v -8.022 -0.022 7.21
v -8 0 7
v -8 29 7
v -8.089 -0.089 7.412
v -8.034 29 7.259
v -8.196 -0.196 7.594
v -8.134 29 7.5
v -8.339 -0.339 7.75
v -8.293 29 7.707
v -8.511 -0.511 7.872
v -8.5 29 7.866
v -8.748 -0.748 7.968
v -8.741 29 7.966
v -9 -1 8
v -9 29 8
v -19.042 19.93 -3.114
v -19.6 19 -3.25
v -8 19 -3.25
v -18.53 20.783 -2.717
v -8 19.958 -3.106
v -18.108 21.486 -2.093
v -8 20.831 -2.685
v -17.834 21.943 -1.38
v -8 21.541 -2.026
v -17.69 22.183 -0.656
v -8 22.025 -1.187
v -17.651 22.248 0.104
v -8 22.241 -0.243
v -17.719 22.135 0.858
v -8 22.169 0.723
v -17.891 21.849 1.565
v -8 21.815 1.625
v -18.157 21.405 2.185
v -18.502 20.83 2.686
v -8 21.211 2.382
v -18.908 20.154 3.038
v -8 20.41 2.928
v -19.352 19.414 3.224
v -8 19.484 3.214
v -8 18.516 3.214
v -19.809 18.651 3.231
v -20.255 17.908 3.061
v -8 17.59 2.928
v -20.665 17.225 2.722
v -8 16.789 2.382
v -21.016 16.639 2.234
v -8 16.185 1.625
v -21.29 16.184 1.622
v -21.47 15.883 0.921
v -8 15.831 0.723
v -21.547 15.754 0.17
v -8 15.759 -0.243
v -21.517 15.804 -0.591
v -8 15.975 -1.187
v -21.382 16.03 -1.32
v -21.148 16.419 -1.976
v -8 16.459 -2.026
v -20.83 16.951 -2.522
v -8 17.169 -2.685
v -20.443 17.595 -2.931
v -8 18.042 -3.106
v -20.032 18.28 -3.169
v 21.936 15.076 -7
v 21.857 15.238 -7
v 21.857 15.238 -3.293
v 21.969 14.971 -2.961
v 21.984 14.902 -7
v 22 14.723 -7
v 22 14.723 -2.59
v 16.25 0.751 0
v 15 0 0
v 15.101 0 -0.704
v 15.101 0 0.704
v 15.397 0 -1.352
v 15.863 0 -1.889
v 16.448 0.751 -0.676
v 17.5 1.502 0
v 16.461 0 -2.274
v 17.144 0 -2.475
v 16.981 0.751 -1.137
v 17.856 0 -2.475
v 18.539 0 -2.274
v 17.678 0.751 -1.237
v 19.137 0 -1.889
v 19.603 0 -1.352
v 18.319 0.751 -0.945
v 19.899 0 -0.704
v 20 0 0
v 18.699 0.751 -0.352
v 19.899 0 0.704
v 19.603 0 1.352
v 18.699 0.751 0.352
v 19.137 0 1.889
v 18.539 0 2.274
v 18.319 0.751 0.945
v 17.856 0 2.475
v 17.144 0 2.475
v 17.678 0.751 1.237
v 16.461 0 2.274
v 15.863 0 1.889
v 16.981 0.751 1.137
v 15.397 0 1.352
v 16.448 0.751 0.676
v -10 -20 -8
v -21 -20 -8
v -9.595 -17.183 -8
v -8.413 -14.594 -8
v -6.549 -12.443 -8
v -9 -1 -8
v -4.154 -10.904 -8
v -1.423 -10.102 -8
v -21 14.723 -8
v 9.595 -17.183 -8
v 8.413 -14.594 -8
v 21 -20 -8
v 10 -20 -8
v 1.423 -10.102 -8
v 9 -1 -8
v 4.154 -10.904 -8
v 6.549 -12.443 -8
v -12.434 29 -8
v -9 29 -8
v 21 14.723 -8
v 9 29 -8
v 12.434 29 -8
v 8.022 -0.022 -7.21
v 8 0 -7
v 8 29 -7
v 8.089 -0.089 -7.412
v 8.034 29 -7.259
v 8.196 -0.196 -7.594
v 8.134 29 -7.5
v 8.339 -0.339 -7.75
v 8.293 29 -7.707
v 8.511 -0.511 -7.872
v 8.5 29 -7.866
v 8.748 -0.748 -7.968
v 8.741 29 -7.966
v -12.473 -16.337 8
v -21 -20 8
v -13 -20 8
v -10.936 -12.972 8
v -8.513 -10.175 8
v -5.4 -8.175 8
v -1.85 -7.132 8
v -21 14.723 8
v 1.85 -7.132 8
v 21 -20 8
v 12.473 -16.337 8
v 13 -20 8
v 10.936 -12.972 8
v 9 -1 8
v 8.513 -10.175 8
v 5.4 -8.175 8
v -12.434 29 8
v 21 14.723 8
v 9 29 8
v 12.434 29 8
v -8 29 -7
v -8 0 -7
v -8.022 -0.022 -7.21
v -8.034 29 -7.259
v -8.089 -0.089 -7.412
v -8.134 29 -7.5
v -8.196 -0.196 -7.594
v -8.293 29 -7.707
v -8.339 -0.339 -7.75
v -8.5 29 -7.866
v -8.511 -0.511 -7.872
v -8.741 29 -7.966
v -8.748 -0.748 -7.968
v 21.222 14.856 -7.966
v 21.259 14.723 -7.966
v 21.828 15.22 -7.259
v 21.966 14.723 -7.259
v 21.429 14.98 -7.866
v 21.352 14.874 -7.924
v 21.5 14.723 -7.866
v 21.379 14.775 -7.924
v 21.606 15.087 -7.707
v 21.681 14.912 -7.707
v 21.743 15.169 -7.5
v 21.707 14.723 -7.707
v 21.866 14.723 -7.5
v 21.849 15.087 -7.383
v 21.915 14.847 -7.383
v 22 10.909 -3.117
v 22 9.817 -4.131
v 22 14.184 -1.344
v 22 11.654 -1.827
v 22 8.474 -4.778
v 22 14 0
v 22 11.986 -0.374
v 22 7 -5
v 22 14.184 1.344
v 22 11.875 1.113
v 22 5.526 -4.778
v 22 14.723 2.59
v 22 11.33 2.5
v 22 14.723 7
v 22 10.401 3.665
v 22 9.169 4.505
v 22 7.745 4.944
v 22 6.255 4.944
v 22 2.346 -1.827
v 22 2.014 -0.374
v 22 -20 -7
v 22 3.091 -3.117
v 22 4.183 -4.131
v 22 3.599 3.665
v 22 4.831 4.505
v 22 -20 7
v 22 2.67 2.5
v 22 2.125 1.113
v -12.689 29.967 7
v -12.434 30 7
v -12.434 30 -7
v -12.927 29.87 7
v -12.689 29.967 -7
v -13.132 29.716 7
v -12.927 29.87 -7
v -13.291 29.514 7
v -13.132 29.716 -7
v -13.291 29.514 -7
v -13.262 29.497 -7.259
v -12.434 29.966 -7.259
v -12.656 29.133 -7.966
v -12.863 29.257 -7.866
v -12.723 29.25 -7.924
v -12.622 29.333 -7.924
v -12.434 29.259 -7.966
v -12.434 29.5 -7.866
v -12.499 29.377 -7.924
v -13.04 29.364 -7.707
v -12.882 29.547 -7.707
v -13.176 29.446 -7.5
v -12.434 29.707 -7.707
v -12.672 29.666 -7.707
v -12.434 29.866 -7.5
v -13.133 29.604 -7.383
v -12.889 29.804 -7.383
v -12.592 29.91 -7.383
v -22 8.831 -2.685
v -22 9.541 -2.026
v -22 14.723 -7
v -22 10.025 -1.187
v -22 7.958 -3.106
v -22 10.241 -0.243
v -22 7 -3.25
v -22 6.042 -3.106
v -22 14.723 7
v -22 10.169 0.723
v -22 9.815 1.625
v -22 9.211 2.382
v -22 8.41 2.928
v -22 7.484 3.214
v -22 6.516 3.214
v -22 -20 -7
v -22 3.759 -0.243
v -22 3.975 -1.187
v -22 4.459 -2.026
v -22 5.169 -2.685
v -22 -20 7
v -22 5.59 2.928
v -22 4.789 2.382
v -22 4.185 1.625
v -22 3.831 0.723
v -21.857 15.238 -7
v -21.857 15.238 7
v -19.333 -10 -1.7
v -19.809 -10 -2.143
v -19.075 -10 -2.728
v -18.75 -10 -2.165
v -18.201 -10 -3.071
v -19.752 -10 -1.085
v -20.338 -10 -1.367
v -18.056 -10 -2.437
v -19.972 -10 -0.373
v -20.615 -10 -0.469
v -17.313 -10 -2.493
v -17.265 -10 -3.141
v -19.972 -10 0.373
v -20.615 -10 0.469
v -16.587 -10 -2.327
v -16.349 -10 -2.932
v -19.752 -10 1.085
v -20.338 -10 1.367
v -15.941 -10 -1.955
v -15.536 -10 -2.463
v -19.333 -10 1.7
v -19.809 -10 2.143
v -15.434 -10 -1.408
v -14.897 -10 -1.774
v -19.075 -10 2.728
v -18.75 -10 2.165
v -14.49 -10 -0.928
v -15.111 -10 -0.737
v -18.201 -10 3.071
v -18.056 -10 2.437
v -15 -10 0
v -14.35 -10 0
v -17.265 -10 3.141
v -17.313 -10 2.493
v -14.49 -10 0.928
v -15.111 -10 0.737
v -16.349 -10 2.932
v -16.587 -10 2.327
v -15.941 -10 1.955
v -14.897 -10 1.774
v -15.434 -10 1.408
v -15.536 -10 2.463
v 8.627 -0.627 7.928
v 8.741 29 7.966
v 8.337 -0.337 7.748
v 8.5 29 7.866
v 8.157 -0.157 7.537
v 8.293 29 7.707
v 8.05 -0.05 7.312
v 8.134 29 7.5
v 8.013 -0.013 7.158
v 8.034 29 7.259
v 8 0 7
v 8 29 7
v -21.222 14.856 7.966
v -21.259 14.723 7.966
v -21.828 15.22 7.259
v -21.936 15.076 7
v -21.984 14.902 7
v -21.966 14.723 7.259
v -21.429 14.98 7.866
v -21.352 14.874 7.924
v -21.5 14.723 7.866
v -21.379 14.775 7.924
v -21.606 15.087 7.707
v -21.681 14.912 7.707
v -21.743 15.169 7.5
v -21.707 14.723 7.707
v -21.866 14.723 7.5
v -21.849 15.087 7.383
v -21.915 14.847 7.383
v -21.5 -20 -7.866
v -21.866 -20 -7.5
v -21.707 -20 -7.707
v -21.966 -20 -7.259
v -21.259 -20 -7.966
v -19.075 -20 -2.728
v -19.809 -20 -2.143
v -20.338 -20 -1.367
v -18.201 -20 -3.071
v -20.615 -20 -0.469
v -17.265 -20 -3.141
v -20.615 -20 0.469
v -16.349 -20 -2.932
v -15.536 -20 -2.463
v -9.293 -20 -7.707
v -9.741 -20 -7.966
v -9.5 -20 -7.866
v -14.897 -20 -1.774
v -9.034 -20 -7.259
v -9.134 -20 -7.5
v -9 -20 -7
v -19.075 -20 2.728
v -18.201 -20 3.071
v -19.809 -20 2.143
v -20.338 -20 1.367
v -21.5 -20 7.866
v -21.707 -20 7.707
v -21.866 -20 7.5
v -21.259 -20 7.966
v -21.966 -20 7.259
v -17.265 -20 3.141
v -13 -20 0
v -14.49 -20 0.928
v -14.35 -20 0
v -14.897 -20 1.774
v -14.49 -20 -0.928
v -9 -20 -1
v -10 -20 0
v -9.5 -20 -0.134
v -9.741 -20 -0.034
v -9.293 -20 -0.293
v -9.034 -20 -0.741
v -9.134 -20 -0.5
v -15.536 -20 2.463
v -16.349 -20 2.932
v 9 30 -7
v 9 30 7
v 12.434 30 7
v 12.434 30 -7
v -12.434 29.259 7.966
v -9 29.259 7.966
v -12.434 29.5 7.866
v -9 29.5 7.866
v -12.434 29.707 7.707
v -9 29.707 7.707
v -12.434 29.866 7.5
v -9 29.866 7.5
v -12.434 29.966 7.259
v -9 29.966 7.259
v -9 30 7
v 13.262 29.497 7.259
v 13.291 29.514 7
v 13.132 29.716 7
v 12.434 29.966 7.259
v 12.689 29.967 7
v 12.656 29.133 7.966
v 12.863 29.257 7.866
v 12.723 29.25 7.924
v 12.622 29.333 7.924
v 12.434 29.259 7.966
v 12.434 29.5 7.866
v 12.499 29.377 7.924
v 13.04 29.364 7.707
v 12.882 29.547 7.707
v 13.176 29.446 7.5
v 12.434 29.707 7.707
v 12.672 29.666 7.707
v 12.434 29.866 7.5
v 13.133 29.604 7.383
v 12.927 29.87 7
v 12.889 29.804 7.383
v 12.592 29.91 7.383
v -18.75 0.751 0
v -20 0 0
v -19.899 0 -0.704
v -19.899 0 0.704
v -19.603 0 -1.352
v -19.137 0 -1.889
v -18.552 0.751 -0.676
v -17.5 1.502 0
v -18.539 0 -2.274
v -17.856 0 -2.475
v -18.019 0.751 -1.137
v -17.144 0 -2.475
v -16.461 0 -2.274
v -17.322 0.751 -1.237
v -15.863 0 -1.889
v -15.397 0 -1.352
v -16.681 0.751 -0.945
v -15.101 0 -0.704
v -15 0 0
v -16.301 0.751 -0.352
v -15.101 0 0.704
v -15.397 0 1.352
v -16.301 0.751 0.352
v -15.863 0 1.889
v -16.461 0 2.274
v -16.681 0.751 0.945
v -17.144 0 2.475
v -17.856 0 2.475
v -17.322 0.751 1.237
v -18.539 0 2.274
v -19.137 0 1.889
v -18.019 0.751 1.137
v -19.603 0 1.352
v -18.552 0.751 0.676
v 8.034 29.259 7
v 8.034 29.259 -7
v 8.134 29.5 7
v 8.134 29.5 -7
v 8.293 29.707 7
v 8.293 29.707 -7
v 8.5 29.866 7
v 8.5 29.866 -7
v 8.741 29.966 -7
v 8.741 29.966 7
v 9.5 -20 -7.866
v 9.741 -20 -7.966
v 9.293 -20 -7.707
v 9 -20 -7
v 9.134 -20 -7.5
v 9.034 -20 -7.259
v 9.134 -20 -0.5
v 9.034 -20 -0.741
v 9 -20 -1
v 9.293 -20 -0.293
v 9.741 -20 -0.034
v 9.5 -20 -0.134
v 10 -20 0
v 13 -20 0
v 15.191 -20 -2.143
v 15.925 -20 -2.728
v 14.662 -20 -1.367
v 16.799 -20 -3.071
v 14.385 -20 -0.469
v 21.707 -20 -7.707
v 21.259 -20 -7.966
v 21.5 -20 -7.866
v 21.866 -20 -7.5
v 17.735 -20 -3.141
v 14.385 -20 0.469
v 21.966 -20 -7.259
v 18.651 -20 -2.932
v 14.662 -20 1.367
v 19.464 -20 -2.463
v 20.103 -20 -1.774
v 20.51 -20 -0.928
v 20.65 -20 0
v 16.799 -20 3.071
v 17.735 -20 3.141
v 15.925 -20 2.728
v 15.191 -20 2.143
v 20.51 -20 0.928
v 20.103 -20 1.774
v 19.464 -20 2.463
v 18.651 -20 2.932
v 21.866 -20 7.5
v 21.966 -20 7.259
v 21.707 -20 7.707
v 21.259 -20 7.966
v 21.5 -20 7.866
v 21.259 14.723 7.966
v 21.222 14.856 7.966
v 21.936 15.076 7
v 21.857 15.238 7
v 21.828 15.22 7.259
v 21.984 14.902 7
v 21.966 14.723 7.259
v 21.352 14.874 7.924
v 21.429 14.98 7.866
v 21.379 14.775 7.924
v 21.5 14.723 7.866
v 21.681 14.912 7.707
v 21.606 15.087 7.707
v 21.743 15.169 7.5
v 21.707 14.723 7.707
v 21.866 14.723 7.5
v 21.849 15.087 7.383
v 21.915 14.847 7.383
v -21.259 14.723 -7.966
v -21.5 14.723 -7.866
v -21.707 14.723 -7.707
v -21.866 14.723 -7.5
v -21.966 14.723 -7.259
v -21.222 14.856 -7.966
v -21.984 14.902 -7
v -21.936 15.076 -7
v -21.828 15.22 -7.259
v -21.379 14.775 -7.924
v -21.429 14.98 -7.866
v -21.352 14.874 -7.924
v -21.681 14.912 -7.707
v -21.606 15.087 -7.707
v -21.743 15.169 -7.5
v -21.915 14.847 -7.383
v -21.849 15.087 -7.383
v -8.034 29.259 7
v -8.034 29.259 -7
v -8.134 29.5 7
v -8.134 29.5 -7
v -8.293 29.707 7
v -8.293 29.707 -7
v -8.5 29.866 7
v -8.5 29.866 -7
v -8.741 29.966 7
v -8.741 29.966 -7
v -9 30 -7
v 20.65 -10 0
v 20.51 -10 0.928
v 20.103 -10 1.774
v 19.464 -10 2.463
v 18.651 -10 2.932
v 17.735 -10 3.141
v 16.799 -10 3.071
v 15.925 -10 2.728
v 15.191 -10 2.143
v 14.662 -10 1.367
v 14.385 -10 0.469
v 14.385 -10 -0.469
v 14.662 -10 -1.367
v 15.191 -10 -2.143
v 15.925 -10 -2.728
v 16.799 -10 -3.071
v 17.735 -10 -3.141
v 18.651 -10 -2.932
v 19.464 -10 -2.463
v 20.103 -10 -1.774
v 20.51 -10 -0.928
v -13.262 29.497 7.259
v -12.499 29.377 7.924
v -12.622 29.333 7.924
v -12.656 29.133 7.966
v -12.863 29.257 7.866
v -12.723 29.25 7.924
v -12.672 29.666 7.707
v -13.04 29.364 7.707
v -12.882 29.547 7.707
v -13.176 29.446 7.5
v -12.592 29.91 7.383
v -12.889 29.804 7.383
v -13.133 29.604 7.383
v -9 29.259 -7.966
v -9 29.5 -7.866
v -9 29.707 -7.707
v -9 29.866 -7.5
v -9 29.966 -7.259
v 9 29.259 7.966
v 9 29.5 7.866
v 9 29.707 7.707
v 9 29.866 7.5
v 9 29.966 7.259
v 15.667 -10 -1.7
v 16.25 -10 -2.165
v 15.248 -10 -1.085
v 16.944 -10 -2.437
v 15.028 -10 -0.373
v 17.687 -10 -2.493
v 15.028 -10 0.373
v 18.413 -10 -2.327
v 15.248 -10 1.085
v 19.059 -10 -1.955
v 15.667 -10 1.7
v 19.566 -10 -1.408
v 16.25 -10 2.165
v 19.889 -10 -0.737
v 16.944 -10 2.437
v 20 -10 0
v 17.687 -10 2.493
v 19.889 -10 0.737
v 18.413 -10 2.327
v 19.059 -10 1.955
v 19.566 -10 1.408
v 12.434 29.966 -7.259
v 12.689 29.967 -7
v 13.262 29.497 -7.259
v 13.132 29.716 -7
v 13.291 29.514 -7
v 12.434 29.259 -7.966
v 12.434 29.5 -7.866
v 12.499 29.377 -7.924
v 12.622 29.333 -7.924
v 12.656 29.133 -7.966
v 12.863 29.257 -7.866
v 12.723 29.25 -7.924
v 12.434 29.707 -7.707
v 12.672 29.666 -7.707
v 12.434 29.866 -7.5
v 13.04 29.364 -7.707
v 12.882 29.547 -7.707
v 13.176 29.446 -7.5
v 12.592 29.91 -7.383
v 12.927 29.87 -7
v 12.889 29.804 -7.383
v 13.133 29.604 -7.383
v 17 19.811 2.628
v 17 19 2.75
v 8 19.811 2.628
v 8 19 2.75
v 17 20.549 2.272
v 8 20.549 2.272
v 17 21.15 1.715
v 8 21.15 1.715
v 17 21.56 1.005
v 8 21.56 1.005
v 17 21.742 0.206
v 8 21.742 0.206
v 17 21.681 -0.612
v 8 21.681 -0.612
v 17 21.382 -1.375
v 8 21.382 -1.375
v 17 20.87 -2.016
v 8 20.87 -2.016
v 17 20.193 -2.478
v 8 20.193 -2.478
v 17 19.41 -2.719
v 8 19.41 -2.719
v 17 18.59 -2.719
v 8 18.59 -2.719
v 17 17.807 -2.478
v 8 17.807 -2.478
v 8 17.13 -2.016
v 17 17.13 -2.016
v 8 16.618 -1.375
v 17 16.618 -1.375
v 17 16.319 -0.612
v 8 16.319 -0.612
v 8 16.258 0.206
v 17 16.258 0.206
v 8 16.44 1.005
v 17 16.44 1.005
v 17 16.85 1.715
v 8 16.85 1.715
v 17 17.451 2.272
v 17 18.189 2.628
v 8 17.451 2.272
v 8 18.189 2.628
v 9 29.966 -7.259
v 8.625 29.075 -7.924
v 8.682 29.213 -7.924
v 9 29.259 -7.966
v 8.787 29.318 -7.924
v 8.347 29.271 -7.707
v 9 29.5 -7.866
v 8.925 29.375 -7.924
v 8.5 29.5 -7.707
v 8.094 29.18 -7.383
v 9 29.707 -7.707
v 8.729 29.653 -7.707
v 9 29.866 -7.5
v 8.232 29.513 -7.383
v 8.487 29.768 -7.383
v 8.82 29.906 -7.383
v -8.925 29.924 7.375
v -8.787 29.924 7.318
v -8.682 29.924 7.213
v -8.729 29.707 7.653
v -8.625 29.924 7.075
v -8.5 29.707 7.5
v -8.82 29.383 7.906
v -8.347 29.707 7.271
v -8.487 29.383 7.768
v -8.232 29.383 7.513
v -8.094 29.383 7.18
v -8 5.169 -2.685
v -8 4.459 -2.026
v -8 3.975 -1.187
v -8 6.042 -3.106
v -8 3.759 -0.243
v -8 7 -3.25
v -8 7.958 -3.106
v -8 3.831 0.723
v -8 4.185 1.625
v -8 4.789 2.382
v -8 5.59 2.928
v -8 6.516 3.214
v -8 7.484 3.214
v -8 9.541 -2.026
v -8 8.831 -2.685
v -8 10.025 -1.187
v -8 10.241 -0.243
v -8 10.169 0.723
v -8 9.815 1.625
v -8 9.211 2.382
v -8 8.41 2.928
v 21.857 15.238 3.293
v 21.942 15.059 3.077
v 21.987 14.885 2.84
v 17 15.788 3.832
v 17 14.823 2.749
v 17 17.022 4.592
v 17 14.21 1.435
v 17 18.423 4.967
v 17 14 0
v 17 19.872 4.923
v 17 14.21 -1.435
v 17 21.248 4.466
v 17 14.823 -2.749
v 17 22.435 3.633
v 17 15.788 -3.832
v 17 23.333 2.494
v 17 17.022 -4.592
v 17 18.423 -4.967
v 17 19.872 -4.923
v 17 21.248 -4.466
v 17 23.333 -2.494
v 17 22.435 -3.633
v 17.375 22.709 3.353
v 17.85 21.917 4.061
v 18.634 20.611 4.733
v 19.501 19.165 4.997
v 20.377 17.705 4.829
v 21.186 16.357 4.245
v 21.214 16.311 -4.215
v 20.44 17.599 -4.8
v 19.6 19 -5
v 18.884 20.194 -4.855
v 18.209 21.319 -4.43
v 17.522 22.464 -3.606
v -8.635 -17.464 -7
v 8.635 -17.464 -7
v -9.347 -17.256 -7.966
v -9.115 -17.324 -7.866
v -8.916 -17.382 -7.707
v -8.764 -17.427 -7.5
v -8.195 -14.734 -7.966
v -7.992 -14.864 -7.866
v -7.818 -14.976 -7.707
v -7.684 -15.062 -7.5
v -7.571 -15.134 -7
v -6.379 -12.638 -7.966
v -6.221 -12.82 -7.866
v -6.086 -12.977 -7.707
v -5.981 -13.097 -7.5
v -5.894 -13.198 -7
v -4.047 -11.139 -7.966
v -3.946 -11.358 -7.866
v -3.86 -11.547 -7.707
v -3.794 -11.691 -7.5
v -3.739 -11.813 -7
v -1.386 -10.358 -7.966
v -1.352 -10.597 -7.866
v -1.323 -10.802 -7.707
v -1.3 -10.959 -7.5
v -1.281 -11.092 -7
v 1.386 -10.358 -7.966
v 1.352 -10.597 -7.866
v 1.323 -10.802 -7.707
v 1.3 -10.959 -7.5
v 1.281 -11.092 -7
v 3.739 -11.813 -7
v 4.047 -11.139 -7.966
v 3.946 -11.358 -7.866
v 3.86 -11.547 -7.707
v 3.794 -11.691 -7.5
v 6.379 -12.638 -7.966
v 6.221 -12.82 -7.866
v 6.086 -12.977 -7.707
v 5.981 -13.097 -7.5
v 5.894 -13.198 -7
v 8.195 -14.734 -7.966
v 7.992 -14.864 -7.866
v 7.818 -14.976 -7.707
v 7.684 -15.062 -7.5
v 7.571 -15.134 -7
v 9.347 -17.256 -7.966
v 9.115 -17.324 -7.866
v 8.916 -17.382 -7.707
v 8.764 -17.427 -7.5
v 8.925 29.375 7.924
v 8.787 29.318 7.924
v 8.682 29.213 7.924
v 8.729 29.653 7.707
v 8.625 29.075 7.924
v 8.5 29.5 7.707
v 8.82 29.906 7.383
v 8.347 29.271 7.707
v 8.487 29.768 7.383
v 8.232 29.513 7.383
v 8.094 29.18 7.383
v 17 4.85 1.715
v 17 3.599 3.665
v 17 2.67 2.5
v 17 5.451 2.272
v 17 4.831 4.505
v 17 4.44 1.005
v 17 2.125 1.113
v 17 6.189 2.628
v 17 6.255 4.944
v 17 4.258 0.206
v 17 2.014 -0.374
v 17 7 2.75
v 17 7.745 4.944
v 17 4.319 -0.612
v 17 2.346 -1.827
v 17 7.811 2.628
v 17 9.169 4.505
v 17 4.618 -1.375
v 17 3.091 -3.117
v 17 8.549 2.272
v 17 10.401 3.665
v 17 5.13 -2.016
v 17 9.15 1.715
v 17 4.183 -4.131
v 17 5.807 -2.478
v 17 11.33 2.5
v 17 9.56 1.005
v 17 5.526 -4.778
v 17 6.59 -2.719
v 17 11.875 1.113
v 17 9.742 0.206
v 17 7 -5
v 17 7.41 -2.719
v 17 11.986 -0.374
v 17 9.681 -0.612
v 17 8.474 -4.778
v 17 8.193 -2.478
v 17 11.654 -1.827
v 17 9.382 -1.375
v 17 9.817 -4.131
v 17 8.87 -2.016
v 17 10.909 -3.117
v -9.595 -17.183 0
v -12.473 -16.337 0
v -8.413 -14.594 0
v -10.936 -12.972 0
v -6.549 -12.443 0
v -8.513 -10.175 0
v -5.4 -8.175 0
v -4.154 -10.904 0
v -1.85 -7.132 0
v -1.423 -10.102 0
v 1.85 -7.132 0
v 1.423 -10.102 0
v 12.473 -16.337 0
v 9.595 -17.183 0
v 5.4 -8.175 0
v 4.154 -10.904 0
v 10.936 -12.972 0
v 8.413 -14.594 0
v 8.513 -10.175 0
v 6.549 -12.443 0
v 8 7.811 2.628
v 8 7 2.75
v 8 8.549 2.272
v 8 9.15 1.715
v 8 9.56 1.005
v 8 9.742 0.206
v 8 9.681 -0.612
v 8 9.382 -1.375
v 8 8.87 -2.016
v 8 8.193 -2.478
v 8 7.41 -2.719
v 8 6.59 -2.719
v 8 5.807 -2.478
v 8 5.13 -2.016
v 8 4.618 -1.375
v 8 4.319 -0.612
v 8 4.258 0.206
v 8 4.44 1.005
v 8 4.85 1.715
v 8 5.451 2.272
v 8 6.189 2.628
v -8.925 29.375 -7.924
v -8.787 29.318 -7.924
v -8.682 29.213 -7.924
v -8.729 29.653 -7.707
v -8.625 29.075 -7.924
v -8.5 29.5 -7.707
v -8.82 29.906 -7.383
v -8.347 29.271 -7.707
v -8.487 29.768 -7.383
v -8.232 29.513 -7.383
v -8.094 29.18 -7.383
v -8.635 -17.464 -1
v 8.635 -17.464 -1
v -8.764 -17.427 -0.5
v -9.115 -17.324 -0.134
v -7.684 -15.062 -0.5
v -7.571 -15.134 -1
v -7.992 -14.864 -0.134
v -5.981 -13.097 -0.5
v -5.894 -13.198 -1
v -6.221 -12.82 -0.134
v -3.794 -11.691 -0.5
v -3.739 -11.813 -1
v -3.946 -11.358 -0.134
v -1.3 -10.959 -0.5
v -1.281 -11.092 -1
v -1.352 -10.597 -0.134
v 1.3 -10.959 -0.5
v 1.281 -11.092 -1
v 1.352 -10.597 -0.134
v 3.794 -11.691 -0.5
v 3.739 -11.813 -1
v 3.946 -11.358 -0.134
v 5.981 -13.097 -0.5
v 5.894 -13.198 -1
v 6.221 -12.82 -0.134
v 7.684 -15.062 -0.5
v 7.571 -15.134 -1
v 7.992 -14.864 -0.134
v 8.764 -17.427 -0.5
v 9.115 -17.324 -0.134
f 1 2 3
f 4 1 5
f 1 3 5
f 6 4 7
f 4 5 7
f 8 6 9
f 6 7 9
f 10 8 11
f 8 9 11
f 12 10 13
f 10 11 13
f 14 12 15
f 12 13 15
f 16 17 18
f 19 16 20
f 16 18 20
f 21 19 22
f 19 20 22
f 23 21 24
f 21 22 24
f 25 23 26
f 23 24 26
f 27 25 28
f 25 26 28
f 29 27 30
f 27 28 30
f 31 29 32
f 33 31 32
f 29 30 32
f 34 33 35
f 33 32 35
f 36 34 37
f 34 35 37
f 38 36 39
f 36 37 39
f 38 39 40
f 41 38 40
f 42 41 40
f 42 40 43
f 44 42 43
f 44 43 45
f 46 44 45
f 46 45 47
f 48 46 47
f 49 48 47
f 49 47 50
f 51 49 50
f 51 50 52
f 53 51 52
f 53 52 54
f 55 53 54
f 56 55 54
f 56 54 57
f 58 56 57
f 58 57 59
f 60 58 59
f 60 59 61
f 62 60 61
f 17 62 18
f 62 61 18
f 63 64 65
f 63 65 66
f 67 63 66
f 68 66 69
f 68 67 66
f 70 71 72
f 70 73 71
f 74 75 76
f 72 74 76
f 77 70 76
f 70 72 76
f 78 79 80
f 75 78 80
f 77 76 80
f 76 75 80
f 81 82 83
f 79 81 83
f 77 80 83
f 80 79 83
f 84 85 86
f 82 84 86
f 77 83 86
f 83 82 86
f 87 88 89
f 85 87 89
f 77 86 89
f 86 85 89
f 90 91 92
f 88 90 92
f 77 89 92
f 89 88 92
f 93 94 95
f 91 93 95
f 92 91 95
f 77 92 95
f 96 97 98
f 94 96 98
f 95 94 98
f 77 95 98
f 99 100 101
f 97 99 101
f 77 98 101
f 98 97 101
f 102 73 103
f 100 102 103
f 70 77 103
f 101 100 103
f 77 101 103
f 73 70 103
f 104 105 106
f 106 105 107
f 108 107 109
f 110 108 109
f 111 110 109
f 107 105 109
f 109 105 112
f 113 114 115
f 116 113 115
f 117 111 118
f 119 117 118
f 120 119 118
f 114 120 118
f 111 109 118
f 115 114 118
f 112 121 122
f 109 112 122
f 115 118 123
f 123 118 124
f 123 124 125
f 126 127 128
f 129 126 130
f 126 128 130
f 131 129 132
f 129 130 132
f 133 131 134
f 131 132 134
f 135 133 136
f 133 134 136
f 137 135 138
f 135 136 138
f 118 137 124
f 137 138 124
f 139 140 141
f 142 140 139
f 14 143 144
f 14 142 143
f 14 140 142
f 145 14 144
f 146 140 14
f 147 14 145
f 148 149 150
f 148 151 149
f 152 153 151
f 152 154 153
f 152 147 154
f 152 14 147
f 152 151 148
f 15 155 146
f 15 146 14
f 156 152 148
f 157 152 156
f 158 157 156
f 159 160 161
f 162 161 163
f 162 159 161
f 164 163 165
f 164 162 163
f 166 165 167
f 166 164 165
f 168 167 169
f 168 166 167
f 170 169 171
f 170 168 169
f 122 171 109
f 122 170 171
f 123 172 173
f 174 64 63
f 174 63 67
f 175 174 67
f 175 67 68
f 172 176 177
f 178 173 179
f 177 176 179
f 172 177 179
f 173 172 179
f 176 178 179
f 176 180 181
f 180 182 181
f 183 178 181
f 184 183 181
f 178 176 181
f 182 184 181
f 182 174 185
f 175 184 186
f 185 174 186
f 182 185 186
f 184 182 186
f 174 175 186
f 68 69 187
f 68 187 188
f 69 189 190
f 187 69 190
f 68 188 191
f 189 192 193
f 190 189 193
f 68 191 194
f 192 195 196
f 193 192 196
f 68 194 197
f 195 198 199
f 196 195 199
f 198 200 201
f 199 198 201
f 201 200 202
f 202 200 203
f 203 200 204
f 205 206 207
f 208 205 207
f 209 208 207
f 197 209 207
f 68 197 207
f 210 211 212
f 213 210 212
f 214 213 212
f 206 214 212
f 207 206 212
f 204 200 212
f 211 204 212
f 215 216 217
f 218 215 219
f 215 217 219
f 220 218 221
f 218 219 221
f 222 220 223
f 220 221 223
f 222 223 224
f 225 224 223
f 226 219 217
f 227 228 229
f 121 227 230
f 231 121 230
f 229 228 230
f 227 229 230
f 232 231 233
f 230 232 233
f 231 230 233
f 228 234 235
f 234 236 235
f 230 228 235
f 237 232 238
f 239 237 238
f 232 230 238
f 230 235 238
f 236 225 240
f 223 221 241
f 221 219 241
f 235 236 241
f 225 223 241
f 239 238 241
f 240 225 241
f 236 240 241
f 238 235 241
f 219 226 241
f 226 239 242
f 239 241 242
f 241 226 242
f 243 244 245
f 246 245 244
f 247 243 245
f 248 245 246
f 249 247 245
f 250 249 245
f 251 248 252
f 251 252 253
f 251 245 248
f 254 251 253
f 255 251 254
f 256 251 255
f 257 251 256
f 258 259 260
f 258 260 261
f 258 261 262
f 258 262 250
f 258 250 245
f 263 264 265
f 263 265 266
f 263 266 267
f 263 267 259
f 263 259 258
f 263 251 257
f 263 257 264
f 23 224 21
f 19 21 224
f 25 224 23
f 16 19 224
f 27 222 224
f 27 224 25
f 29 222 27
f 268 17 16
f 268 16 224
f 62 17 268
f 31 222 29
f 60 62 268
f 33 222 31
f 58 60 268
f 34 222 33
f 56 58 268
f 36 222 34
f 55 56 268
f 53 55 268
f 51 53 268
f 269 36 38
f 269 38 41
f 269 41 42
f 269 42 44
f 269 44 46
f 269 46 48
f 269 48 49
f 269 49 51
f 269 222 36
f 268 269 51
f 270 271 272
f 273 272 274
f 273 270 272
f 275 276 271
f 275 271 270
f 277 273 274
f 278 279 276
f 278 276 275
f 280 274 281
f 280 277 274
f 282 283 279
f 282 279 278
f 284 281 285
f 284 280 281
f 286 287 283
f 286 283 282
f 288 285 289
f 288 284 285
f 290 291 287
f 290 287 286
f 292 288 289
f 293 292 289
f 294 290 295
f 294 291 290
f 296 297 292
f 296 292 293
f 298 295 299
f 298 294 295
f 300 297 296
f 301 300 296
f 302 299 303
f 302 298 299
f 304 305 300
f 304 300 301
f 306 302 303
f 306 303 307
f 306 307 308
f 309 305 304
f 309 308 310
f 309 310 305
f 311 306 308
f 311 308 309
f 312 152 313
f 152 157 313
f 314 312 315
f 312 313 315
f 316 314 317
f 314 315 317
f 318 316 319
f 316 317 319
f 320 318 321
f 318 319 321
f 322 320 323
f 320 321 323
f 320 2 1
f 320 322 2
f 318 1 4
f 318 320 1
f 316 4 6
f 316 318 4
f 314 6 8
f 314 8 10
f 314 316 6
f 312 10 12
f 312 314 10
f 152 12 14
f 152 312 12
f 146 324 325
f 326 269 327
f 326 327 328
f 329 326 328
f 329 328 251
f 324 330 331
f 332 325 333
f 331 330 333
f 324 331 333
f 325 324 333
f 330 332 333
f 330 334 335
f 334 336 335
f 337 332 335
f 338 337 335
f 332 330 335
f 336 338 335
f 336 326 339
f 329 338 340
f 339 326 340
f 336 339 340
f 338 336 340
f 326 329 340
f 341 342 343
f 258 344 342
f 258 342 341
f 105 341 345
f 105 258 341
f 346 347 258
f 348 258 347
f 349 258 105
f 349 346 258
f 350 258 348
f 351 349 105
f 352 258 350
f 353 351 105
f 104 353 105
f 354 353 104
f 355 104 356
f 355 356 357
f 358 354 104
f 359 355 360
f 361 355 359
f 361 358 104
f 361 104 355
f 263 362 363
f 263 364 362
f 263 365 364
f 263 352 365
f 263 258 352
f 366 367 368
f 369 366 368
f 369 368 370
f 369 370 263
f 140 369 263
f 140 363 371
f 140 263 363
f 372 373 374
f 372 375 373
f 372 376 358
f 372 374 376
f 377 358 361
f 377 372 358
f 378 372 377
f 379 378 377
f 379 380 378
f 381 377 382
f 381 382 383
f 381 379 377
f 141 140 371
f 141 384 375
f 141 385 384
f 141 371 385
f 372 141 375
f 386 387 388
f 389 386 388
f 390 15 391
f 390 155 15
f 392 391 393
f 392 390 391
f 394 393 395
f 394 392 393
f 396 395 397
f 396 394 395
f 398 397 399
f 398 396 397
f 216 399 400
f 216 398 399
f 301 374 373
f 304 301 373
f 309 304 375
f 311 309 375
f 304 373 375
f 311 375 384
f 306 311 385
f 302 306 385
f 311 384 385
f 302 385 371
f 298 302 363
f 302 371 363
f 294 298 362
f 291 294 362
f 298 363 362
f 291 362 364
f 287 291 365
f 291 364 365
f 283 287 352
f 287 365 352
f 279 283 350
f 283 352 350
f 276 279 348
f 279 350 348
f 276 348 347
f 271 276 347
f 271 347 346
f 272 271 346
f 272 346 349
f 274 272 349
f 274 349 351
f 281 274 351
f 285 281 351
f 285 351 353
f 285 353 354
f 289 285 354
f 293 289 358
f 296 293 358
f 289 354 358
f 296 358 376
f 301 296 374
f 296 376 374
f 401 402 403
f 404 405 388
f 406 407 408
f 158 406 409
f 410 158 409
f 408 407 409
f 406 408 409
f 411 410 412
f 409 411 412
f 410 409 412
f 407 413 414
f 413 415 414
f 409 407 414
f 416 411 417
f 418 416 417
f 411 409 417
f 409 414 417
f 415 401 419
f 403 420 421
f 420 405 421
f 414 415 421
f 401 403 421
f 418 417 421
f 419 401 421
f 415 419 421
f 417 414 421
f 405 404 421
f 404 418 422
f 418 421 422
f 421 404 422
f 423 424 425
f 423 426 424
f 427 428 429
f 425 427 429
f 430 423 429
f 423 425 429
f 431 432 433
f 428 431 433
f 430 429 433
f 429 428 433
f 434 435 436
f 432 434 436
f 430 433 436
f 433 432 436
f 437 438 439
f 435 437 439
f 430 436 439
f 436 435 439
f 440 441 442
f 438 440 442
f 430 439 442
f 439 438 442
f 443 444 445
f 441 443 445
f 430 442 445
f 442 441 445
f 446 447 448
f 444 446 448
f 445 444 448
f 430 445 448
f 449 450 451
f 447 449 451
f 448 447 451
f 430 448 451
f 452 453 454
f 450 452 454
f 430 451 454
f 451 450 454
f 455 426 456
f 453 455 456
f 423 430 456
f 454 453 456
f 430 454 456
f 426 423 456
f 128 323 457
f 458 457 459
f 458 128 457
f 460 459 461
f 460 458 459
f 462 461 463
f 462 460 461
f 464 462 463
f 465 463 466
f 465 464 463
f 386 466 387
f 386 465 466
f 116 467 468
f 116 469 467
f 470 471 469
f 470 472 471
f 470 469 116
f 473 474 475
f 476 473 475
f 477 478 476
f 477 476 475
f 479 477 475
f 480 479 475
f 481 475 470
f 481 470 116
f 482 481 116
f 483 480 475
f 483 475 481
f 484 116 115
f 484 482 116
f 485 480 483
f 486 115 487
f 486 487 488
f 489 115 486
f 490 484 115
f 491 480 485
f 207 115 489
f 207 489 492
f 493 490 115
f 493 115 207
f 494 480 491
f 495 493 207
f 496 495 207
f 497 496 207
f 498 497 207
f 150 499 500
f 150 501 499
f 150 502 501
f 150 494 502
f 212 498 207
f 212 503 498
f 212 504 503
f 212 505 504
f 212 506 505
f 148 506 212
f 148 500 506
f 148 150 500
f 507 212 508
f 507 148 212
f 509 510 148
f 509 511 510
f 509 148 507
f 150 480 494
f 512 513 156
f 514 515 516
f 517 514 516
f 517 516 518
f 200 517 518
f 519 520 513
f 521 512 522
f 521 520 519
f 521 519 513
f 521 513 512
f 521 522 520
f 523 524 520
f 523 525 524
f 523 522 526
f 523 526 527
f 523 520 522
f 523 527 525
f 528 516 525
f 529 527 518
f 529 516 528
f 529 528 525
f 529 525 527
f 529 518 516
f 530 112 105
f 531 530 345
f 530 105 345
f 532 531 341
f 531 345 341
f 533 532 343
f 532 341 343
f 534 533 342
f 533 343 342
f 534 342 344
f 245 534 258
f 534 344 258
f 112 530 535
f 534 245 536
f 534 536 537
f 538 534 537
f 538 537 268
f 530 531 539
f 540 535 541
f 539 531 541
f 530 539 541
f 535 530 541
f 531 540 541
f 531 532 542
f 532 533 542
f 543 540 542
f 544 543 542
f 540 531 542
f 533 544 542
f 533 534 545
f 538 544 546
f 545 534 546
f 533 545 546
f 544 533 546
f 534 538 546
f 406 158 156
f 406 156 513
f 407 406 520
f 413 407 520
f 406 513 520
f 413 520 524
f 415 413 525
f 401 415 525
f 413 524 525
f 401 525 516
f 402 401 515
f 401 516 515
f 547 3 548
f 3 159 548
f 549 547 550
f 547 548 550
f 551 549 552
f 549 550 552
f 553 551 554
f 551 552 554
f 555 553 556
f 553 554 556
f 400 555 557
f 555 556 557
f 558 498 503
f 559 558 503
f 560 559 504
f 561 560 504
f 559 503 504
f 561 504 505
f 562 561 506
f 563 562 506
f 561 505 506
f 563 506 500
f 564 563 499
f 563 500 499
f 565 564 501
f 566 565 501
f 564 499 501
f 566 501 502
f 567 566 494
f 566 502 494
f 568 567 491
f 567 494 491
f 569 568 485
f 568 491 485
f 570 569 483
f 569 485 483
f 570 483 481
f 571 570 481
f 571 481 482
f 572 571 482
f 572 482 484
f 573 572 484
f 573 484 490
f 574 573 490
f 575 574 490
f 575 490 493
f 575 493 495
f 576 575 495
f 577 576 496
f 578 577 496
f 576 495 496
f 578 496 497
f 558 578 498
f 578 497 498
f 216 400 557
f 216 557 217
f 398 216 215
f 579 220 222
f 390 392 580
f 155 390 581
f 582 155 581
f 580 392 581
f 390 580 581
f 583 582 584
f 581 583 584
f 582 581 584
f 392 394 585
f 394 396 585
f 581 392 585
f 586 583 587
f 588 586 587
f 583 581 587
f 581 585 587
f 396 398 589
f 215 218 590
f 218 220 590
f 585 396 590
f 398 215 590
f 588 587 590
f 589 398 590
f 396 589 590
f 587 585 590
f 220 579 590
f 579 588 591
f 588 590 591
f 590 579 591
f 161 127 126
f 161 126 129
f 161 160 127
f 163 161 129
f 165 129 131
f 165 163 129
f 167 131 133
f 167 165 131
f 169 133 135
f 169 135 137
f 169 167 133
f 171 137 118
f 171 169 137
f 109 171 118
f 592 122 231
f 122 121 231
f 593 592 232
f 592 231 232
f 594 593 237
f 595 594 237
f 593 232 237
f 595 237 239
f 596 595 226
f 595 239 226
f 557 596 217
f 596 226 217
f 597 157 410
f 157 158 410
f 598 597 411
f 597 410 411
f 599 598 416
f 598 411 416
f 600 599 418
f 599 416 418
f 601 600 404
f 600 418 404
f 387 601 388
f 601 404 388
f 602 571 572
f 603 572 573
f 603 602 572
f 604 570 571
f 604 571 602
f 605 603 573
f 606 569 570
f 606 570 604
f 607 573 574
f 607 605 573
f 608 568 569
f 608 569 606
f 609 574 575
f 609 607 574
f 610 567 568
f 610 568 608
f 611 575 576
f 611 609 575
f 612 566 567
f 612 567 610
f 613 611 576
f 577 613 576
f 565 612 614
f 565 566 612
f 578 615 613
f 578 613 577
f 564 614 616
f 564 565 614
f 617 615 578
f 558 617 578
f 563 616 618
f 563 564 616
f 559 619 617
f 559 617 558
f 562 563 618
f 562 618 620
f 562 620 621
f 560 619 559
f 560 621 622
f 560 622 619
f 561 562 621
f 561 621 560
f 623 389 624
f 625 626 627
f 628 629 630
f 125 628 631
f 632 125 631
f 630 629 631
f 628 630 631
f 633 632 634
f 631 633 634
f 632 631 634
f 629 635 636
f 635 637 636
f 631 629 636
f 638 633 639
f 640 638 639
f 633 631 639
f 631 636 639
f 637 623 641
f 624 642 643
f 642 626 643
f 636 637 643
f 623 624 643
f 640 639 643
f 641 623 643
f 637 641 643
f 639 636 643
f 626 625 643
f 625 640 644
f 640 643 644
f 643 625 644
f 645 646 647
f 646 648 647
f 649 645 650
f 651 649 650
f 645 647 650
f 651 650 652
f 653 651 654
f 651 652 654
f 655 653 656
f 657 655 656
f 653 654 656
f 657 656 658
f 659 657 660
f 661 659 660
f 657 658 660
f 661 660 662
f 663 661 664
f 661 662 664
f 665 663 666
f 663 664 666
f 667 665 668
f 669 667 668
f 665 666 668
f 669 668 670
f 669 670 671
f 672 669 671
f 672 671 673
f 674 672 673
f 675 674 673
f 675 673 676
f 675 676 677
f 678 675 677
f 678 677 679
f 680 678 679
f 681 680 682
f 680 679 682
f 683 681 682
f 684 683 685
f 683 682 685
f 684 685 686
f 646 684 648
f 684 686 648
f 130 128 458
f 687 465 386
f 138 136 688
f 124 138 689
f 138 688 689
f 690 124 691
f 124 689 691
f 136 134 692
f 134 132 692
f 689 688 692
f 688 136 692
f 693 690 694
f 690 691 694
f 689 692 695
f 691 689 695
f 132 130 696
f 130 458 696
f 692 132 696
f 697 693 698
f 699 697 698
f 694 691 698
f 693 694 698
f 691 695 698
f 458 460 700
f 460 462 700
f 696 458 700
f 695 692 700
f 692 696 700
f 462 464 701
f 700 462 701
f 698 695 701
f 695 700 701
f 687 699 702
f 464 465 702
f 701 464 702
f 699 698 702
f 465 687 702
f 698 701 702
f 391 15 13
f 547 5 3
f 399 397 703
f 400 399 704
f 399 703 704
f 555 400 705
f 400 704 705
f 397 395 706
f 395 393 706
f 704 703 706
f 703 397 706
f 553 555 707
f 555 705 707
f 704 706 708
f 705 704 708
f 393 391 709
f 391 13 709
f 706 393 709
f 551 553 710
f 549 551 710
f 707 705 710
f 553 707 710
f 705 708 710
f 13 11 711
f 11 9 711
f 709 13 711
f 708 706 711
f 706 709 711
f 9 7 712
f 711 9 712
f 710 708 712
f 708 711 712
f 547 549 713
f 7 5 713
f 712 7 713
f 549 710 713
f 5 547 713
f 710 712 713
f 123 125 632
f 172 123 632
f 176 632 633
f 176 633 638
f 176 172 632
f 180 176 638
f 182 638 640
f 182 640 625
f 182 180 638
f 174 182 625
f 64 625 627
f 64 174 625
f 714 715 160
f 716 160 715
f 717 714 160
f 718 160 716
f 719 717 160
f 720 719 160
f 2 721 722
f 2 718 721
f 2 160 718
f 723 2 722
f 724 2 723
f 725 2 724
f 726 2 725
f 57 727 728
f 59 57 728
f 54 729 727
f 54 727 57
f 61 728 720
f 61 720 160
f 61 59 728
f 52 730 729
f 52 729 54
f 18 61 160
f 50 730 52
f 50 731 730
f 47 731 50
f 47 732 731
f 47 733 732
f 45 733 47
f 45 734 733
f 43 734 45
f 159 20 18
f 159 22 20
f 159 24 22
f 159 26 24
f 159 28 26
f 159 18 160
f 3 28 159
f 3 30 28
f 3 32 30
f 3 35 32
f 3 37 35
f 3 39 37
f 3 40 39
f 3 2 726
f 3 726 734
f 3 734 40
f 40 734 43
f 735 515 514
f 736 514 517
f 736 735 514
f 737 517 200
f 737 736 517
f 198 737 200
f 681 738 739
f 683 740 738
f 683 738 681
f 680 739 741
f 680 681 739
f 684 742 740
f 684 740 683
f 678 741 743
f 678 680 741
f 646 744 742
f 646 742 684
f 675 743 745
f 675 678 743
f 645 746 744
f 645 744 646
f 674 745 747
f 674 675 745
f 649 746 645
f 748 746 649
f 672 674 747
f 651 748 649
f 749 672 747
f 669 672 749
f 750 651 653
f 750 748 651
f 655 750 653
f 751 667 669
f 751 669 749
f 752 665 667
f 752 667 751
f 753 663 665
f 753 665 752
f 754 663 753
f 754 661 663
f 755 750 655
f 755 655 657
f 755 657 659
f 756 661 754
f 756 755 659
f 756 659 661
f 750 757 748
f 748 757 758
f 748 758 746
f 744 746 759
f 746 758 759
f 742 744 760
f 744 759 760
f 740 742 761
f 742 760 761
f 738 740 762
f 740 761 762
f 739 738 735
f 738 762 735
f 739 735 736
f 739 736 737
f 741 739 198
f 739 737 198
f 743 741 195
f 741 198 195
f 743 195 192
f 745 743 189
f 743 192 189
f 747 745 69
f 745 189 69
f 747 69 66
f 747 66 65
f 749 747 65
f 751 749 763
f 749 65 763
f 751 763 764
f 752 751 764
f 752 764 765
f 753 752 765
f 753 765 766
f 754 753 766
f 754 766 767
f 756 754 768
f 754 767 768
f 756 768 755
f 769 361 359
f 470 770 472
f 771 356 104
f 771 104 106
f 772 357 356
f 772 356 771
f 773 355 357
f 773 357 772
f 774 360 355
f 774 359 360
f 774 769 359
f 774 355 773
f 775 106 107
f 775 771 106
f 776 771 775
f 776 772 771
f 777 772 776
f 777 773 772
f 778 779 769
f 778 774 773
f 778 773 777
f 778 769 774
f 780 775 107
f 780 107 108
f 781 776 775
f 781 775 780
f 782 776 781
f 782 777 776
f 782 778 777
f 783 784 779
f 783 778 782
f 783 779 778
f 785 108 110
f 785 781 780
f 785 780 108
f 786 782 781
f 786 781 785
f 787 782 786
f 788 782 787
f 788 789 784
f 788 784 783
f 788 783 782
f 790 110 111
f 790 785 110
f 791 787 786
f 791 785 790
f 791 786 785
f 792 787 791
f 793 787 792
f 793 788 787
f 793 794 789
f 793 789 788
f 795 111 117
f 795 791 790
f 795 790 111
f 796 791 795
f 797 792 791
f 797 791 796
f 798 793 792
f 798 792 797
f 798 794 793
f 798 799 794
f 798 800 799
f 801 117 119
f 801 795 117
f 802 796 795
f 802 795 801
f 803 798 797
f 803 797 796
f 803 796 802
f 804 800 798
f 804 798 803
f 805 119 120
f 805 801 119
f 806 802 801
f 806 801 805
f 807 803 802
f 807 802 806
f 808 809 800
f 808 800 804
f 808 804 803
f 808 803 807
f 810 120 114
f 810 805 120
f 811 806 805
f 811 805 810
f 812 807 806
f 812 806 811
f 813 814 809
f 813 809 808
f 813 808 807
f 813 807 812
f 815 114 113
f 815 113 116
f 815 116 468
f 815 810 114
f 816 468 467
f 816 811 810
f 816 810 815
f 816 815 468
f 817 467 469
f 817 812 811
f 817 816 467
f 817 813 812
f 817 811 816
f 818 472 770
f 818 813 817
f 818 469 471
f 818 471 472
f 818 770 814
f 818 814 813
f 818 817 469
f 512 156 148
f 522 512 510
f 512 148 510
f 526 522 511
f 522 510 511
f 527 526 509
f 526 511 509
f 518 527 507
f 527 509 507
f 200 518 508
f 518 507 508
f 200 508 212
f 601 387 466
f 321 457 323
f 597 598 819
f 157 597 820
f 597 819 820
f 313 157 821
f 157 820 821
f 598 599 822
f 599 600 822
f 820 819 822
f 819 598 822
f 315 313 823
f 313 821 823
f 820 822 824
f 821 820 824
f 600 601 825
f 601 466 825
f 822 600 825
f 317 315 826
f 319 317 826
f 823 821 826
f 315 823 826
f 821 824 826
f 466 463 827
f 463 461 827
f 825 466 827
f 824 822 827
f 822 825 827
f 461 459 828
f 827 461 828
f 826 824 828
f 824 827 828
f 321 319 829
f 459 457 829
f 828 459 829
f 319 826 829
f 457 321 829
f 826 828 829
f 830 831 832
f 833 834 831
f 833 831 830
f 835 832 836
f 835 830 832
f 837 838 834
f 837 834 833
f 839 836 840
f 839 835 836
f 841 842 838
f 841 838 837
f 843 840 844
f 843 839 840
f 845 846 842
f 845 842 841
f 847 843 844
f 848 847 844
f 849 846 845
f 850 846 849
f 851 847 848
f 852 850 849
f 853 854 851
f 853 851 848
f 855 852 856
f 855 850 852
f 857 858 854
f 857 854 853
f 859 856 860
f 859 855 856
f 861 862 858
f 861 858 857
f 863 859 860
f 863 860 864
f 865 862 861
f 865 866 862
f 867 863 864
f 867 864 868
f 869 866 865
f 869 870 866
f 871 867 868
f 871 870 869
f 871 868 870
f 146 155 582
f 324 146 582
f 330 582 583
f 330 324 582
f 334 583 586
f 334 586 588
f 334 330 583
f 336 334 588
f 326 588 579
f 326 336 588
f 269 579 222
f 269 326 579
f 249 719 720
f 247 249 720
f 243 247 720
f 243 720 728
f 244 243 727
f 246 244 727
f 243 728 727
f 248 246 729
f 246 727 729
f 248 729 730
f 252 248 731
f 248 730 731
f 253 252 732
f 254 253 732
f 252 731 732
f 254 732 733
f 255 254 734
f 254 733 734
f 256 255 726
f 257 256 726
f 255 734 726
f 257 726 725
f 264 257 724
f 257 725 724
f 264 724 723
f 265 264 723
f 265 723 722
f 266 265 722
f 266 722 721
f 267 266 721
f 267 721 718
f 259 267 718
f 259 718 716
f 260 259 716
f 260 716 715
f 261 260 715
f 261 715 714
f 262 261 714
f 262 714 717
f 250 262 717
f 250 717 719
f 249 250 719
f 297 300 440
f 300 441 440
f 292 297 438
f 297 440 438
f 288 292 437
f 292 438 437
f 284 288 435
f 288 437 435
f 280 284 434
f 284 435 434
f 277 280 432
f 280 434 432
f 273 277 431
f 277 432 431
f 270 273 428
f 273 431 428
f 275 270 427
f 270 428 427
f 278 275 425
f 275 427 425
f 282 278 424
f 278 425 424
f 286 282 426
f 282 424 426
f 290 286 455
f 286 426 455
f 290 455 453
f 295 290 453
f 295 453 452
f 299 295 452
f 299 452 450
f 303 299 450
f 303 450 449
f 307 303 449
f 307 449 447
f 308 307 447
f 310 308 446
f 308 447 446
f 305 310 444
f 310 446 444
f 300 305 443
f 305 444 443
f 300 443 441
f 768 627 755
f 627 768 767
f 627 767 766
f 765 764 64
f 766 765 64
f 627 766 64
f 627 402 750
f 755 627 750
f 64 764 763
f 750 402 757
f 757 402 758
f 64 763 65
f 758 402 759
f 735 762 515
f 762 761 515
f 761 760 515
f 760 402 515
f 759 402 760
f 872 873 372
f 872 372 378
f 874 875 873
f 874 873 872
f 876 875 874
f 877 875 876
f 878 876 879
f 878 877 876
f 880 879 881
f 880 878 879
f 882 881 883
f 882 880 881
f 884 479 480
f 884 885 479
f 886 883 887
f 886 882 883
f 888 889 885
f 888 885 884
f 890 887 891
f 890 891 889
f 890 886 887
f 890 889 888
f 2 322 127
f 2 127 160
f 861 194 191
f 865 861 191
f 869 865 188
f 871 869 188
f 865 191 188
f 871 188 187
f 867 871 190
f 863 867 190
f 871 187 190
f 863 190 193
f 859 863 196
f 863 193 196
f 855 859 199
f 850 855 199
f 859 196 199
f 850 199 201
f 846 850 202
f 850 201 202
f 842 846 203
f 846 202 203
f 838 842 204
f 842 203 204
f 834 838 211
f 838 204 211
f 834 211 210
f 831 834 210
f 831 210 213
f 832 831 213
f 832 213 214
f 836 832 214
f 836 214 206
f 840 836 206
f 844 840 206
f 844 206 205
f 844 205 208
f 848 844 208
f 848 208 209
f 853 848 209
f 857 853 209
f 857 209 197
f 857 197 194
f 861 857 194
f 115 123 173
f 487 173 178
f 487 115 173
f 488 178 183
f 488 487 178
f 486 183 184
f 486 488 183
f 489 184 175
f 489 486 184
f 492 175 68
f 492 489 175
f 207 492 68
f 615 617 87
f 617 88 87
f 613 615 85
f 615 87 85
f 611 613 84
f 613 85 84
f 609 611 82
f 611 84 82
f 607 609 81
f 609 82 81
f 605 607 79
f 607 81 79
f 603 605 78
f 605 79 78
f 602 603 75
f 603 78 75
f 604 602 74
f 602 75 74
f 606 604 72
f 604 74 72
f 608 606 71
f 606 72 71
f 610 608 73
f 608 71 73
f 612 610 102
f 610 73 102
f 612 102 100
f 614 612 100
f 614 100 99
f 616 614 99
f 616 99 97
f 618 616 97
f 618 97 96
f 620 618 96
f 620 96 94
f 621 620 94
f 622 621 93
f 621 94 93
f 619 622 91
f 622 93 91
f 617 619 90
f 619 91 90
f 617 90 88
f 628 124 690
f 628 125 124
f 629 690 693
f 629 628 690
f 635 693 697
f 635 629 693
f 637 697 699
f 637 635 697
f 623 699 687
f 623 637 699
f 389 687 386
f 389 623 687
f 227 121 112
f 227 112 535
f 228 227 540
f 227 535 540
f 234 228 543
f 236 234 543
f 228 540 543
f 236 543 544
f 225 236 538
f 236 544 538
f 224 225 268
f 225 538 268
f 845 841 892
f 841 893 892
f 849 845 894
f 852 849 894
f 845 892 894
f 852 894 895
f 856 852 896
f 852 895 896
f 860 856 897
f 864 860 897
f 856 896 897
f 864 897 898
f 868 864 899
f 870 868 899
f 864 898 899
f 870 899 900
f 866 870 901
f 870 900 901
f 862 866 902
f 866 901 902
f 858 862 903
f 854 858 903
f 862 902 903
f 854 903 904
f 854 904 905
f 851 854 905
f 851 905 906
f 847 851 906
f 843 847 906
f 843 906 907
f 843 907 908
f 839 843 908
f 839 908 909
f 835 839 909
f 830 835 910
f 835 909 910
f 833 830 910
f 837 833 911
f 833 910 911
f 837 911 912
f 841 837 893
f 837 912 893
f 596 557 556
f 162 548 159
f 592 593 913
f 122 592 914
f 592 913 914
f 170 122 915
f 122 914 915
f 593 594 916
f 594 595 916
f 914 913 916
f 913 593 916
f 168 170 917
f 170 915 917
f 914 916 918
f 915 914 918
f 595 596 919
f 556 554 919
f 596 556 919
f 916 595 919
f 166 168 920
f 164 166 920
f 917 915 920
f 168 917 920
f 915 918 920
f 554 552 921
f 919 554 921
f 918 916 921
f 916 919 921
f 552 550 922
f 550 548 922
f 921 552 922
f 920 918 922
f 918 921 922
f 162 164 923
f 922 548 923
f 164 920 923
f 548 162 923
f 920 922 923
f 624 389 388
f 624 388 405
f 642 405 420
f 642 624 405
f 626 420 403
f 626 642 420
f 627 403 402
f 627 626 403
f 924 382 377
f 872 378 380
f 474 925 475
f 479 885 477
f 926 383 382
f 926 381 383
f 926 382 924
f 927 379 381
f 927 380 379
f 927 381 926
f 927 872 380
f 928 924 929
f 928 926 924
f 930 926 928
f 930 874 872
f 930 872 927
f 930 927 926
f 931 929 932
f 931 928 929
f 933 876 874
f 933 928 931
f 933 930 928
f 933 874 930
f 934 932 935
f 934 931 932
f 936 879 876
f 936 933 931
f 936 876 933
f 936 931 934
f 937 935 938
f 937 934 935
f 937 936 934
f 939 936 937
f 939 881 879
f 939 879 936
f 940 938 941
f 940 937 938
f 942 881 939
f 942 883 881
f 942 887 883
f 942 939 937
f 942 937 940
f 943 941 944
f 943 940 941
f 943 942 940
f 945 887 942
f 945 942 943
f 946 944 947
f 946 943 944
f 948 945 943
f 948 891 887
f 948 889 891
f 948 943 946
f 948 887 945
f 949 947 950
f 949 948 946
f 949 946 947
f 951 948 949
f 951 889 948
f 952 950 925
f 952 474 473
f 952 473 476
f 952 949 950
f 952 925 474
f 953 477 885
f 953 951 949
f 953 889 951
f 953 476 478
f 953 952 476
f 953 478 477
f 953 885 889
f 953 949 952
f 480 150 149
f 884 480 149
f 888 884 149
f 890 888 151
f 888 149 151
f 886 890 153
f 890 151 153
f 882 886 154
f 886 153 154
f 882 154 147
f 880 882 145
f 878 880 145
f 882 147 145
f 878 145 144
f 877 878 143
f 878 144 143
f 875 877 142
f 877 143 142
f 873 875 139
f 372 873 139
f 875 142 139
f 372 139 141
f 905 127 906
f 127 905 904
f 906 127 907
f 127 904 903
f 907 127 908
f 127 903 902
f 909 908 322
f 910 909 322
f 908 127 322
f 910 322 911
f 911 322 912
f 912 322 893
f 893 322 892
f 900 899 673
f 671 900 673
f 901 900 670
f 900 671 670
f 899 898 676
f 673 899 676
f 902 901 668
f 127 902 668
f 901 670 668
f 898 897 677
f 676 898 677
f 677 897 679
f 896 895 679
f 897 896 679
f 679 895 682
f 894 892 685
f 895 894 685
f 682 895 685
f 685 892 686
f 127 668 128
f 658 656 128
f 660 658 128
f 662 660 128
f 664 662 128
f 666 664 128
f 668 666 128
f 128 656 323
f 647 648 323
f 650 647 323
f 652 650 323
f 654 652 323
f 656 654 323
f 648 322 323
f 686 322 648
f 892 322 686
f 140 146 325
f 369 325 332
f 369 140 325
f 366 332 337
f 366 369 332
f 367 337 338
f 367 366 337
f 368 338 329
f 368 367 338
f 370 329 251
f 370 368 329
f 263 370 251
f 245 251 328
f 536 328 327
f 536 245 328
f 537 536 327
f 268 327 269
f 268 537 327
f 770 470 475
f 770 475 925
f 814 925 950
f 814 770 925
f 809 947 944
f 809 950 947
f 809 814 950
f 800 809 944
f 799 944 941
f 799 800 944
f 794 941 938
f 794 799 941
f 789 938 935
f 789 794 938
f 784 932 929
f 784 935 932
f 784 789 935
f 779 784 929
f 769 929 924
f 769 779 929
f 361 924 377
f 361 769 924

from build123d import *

# Parameters (mm, degrees)
DODANIE_WYCI_GNI_CIE1_DEPTH                       = 8
WYTNIJ_WYCI_GNI_CIE1_DEPTH                        = 8
WYTNIJ_WYCI_GNI_CIE2_DEPTH                        = 39.052595181
WYTNIJ_WYCI_GNI_CIE2_DEPTH_BACK                   = 39.052595181
OTWORY_USTALAJ_CE_5_0MM1_D                        = 5
OTWORY_USTALAJ_CE_5_0MM1_DEPTH                    = 20
OTWORY_USTALAJ_CE_5_0MM1_TIP                      = 1.502151548
SZKIC8_R                                          = 3.15
WYTNIJ_WYCI_GNI_CIE3_DEPTH                        = 10
ZAOKR_GLENIE1_R                                   = 1
POG_BIENIE_WALCOWE_POD_M5_RUB_Z_BEM_W_D           = 5.5
POG_BIENIE_WALCOWE_POD_M5_RUB_Z_BEM_W_DEPTH       = 44
POG_BIENIE_WALCOWE_POD_M5_RUB_Z_BEM_W_CBORE_D     = 10
POG_BIENIE_WALCOWE_POD_M5_RUB_Z_BEM_W_CBORE_DEPTH = 5
POG_BIENIE_WALCOWE_POD_M5_RUB_Z_BEM_W_TIP         = 1.652366702
SZKIC11_R                                         = 3.25
WYTNIJ_WYCI_GNI_CIE4_DEPTH                        = 44.174066359


with BuildPart() as part:
    # Szkic1 → Dodanie-wyciągnięcie1 (new, symmetric)
    with BuildSketch(Plane.XY):
        Polygon((0, 0), (8, 0), (8, 30), (13, 30), (22, 15), (22, -20), (0, -20), align=None)
    dodanie_wyci_gni_cie1 = extrude(amount=DODANIE_WYCI_GNI_CIE1_DEPTH, both=True)

    # Lustro1: Dodanie-wyciągnięcie1 across plane
    add(dodanie_wyci_gni_cie1.mirror(Plane(origin=(0, -20, 8), x_dir=(0, 0, 1), z_dir=(1, 0, 0))))

    # Szkic2 → Wytnij-wyciągnięcie1 (cut)
    with BuildSketch(Plane.XY.offset(8)):
        with BuildLine():
            Line((-13, -20), (13, -20))
            ThreePointArc((13, -20), (0, -7), (-13, -20))
        make_face()
    extrude(amount=-WYTNIJ_WYCI_GNI_CIE1_DEPTH, mode=Mode.SUBTRACT)

    # Szkic3 → Wytnij-wyciągnięcie2 (cut, two sides: drawn at the far end of the back side and taken through both)
    with BuildSketch(Plane.XY.offset(-WYTNIJ_WYCI_GNI_CIE2_DEPTH_BACK)):
        with BuildLine():
            ThreePointArc((9, -20), (0, -11), (-9, -20))
            Line((-9, -20), (9, -20))
        make_face()
    extrude(amount=WYTNIJ_WYCI_GNI_CIE2_DEPTH + WYTNIJ_WYCI_GNI_CIE2_DEPTH_BACK, mode=Mode.SUBTRACT)

    # Otwory ustalające Ø5.0mm1
    with Locations(Plane(origin=(0, -20, 0), x_dir=(-1, 0, 0), z_dir=(0, -1, 0))):
        with Locations((-17.5, 0), (17.5, 0)):
            Hole(OTWORY_USTALAJ_CE_5_0MM1_D / 2, depth=OTWORY_USTALAJ_CE_5_0MM1_DEPTH)
            with Locations((0, 0, -(OTWORY_USTALAJ_CE_5_0MM1_DEPTH + OTWORY_USTALAJ_CE_5_0MM1_TIP / 2))):  # 118° drill point
                Cone(0, OTWORY_USTALAJ_CE_5_0MM1_D / 2, OTWORY_USTALAJ_CE_5_0MM1_TIP, mode=Mode.SUBTRACT)

    # Szkic8 → Wytnij-wyciągnięcie3 (cut)
    with BuildSketch(Plane(origin=(0, -20, 0), x_dir=(-1, 0, 0), z_dir=(0, -1, 0))):
        with Locations(Location((17.5, 0, 0), (0, 0, 180))):
            Circle(SZKIC8_R)
        with Locations(Location((-17.5, 0, 0), (0, 0, 180))):
            Circle(SZKIC8_R)
    extrude(amount=-WYTNIJ_WYCI_GNI_CIE3_DEPTH, mode=Mode.SUBTRACT)

    # Zaokrąglenie1
    zaokr_glenie1_edges = [part.edges().sort_by_distance(p)[0] for p in [
        (8, 30, 0),
        (22, -2.5, 8),
        (13, 30, 0),
        (22, 15, 0),
        (17.5, 22.5, 8),
        (10.5, 30, 8),
        (-8, 15, 8),
        (-10.5, 30, 8),
        (-8, 30, 0),
        (-17.5, 22.5, 8),
        (-13, 30, 0),
        (-22, -2.5, 8),
        (-22, 15, 0),
        (-22, -2.5, -8),
        (8, 15, 8),
        (-17.5, 22.5, -8),
        (-10.5, 30, -8),
        (-8, 15, -8),
        (0, 0, 8),
        (0, -11, 0),
        (0, -11, -8),
        (0, 0, -8),
        (8, 15, -8),
        (10.5, 30, -8),
        (17.5, 22.5, -8),
        (22, -2.5, -8),
    ]]
    fillet(zaokr_glenie1_edges, radius=ZAOKR_GLENIE1_R)

    # Pogłębienie walcowe pod M5 Śrubę z łbem walcowym z gniazdem2
    with Locations(Plane(origin=(22, 156, 204.349537134), x_dir=(0, 0, -1), z_dir=(1, 0, 0))):
        with Locations((204.349537134, -149), (204.349537134, -137)):
            CounterBoreHole(POG_BIENIE_WALCOWE_POD_M5_RUB_Z_BEM_W_D / 2, POG_BIENIE_WALCOWE_POD_M5_RUB_Z_BEM_W_CBORE_D / 2, POG_BIENIE_WALCOWE_POD_M5_RUB_Z_BEM_W_CBORE_DEPTH, depth=POG_BIENIE_WALCOWE_POD_M5_RUB_Z_BEM_W_DEPTH)
            with Locations((0, 0, -(POG_BIENIE_WALCOWE_POD_M5_RUB_Z_BEM_W_DEPTH + POG_BIENIE_WALCOWE_POD_M5_RUB_Z_BEM_W_TIP / 2))):  # 118° drill point
                Cone(0, POG_BIENIE_WALCOWE_POD_M5_RUB_Z_BEM_W_D / 2, POG_BIENIE_WALCOWE_POD_M5_RUB_Z_BEM_W_TIP, mode=Mode.SUBTRACT)

    # Szkic11 → Wytnij-wyciągnięcie4 (cut, through all)
    with BuildSketch(Plane(origin=(-8, 0, 0), x_dir=(0, 0, -1), z_dir=(1, 0, 0))):
        with Locations((0, 7)):
            Circle(SZKIC11_R)
        with Locations((0, 19)):
            Circle(SZKIC11_R)
    extrude(amount=-WYTNIJ_WYCI_GNI_CIE4_DEPTH, mode=Mode.SUBTRACT)


solid = part.part
